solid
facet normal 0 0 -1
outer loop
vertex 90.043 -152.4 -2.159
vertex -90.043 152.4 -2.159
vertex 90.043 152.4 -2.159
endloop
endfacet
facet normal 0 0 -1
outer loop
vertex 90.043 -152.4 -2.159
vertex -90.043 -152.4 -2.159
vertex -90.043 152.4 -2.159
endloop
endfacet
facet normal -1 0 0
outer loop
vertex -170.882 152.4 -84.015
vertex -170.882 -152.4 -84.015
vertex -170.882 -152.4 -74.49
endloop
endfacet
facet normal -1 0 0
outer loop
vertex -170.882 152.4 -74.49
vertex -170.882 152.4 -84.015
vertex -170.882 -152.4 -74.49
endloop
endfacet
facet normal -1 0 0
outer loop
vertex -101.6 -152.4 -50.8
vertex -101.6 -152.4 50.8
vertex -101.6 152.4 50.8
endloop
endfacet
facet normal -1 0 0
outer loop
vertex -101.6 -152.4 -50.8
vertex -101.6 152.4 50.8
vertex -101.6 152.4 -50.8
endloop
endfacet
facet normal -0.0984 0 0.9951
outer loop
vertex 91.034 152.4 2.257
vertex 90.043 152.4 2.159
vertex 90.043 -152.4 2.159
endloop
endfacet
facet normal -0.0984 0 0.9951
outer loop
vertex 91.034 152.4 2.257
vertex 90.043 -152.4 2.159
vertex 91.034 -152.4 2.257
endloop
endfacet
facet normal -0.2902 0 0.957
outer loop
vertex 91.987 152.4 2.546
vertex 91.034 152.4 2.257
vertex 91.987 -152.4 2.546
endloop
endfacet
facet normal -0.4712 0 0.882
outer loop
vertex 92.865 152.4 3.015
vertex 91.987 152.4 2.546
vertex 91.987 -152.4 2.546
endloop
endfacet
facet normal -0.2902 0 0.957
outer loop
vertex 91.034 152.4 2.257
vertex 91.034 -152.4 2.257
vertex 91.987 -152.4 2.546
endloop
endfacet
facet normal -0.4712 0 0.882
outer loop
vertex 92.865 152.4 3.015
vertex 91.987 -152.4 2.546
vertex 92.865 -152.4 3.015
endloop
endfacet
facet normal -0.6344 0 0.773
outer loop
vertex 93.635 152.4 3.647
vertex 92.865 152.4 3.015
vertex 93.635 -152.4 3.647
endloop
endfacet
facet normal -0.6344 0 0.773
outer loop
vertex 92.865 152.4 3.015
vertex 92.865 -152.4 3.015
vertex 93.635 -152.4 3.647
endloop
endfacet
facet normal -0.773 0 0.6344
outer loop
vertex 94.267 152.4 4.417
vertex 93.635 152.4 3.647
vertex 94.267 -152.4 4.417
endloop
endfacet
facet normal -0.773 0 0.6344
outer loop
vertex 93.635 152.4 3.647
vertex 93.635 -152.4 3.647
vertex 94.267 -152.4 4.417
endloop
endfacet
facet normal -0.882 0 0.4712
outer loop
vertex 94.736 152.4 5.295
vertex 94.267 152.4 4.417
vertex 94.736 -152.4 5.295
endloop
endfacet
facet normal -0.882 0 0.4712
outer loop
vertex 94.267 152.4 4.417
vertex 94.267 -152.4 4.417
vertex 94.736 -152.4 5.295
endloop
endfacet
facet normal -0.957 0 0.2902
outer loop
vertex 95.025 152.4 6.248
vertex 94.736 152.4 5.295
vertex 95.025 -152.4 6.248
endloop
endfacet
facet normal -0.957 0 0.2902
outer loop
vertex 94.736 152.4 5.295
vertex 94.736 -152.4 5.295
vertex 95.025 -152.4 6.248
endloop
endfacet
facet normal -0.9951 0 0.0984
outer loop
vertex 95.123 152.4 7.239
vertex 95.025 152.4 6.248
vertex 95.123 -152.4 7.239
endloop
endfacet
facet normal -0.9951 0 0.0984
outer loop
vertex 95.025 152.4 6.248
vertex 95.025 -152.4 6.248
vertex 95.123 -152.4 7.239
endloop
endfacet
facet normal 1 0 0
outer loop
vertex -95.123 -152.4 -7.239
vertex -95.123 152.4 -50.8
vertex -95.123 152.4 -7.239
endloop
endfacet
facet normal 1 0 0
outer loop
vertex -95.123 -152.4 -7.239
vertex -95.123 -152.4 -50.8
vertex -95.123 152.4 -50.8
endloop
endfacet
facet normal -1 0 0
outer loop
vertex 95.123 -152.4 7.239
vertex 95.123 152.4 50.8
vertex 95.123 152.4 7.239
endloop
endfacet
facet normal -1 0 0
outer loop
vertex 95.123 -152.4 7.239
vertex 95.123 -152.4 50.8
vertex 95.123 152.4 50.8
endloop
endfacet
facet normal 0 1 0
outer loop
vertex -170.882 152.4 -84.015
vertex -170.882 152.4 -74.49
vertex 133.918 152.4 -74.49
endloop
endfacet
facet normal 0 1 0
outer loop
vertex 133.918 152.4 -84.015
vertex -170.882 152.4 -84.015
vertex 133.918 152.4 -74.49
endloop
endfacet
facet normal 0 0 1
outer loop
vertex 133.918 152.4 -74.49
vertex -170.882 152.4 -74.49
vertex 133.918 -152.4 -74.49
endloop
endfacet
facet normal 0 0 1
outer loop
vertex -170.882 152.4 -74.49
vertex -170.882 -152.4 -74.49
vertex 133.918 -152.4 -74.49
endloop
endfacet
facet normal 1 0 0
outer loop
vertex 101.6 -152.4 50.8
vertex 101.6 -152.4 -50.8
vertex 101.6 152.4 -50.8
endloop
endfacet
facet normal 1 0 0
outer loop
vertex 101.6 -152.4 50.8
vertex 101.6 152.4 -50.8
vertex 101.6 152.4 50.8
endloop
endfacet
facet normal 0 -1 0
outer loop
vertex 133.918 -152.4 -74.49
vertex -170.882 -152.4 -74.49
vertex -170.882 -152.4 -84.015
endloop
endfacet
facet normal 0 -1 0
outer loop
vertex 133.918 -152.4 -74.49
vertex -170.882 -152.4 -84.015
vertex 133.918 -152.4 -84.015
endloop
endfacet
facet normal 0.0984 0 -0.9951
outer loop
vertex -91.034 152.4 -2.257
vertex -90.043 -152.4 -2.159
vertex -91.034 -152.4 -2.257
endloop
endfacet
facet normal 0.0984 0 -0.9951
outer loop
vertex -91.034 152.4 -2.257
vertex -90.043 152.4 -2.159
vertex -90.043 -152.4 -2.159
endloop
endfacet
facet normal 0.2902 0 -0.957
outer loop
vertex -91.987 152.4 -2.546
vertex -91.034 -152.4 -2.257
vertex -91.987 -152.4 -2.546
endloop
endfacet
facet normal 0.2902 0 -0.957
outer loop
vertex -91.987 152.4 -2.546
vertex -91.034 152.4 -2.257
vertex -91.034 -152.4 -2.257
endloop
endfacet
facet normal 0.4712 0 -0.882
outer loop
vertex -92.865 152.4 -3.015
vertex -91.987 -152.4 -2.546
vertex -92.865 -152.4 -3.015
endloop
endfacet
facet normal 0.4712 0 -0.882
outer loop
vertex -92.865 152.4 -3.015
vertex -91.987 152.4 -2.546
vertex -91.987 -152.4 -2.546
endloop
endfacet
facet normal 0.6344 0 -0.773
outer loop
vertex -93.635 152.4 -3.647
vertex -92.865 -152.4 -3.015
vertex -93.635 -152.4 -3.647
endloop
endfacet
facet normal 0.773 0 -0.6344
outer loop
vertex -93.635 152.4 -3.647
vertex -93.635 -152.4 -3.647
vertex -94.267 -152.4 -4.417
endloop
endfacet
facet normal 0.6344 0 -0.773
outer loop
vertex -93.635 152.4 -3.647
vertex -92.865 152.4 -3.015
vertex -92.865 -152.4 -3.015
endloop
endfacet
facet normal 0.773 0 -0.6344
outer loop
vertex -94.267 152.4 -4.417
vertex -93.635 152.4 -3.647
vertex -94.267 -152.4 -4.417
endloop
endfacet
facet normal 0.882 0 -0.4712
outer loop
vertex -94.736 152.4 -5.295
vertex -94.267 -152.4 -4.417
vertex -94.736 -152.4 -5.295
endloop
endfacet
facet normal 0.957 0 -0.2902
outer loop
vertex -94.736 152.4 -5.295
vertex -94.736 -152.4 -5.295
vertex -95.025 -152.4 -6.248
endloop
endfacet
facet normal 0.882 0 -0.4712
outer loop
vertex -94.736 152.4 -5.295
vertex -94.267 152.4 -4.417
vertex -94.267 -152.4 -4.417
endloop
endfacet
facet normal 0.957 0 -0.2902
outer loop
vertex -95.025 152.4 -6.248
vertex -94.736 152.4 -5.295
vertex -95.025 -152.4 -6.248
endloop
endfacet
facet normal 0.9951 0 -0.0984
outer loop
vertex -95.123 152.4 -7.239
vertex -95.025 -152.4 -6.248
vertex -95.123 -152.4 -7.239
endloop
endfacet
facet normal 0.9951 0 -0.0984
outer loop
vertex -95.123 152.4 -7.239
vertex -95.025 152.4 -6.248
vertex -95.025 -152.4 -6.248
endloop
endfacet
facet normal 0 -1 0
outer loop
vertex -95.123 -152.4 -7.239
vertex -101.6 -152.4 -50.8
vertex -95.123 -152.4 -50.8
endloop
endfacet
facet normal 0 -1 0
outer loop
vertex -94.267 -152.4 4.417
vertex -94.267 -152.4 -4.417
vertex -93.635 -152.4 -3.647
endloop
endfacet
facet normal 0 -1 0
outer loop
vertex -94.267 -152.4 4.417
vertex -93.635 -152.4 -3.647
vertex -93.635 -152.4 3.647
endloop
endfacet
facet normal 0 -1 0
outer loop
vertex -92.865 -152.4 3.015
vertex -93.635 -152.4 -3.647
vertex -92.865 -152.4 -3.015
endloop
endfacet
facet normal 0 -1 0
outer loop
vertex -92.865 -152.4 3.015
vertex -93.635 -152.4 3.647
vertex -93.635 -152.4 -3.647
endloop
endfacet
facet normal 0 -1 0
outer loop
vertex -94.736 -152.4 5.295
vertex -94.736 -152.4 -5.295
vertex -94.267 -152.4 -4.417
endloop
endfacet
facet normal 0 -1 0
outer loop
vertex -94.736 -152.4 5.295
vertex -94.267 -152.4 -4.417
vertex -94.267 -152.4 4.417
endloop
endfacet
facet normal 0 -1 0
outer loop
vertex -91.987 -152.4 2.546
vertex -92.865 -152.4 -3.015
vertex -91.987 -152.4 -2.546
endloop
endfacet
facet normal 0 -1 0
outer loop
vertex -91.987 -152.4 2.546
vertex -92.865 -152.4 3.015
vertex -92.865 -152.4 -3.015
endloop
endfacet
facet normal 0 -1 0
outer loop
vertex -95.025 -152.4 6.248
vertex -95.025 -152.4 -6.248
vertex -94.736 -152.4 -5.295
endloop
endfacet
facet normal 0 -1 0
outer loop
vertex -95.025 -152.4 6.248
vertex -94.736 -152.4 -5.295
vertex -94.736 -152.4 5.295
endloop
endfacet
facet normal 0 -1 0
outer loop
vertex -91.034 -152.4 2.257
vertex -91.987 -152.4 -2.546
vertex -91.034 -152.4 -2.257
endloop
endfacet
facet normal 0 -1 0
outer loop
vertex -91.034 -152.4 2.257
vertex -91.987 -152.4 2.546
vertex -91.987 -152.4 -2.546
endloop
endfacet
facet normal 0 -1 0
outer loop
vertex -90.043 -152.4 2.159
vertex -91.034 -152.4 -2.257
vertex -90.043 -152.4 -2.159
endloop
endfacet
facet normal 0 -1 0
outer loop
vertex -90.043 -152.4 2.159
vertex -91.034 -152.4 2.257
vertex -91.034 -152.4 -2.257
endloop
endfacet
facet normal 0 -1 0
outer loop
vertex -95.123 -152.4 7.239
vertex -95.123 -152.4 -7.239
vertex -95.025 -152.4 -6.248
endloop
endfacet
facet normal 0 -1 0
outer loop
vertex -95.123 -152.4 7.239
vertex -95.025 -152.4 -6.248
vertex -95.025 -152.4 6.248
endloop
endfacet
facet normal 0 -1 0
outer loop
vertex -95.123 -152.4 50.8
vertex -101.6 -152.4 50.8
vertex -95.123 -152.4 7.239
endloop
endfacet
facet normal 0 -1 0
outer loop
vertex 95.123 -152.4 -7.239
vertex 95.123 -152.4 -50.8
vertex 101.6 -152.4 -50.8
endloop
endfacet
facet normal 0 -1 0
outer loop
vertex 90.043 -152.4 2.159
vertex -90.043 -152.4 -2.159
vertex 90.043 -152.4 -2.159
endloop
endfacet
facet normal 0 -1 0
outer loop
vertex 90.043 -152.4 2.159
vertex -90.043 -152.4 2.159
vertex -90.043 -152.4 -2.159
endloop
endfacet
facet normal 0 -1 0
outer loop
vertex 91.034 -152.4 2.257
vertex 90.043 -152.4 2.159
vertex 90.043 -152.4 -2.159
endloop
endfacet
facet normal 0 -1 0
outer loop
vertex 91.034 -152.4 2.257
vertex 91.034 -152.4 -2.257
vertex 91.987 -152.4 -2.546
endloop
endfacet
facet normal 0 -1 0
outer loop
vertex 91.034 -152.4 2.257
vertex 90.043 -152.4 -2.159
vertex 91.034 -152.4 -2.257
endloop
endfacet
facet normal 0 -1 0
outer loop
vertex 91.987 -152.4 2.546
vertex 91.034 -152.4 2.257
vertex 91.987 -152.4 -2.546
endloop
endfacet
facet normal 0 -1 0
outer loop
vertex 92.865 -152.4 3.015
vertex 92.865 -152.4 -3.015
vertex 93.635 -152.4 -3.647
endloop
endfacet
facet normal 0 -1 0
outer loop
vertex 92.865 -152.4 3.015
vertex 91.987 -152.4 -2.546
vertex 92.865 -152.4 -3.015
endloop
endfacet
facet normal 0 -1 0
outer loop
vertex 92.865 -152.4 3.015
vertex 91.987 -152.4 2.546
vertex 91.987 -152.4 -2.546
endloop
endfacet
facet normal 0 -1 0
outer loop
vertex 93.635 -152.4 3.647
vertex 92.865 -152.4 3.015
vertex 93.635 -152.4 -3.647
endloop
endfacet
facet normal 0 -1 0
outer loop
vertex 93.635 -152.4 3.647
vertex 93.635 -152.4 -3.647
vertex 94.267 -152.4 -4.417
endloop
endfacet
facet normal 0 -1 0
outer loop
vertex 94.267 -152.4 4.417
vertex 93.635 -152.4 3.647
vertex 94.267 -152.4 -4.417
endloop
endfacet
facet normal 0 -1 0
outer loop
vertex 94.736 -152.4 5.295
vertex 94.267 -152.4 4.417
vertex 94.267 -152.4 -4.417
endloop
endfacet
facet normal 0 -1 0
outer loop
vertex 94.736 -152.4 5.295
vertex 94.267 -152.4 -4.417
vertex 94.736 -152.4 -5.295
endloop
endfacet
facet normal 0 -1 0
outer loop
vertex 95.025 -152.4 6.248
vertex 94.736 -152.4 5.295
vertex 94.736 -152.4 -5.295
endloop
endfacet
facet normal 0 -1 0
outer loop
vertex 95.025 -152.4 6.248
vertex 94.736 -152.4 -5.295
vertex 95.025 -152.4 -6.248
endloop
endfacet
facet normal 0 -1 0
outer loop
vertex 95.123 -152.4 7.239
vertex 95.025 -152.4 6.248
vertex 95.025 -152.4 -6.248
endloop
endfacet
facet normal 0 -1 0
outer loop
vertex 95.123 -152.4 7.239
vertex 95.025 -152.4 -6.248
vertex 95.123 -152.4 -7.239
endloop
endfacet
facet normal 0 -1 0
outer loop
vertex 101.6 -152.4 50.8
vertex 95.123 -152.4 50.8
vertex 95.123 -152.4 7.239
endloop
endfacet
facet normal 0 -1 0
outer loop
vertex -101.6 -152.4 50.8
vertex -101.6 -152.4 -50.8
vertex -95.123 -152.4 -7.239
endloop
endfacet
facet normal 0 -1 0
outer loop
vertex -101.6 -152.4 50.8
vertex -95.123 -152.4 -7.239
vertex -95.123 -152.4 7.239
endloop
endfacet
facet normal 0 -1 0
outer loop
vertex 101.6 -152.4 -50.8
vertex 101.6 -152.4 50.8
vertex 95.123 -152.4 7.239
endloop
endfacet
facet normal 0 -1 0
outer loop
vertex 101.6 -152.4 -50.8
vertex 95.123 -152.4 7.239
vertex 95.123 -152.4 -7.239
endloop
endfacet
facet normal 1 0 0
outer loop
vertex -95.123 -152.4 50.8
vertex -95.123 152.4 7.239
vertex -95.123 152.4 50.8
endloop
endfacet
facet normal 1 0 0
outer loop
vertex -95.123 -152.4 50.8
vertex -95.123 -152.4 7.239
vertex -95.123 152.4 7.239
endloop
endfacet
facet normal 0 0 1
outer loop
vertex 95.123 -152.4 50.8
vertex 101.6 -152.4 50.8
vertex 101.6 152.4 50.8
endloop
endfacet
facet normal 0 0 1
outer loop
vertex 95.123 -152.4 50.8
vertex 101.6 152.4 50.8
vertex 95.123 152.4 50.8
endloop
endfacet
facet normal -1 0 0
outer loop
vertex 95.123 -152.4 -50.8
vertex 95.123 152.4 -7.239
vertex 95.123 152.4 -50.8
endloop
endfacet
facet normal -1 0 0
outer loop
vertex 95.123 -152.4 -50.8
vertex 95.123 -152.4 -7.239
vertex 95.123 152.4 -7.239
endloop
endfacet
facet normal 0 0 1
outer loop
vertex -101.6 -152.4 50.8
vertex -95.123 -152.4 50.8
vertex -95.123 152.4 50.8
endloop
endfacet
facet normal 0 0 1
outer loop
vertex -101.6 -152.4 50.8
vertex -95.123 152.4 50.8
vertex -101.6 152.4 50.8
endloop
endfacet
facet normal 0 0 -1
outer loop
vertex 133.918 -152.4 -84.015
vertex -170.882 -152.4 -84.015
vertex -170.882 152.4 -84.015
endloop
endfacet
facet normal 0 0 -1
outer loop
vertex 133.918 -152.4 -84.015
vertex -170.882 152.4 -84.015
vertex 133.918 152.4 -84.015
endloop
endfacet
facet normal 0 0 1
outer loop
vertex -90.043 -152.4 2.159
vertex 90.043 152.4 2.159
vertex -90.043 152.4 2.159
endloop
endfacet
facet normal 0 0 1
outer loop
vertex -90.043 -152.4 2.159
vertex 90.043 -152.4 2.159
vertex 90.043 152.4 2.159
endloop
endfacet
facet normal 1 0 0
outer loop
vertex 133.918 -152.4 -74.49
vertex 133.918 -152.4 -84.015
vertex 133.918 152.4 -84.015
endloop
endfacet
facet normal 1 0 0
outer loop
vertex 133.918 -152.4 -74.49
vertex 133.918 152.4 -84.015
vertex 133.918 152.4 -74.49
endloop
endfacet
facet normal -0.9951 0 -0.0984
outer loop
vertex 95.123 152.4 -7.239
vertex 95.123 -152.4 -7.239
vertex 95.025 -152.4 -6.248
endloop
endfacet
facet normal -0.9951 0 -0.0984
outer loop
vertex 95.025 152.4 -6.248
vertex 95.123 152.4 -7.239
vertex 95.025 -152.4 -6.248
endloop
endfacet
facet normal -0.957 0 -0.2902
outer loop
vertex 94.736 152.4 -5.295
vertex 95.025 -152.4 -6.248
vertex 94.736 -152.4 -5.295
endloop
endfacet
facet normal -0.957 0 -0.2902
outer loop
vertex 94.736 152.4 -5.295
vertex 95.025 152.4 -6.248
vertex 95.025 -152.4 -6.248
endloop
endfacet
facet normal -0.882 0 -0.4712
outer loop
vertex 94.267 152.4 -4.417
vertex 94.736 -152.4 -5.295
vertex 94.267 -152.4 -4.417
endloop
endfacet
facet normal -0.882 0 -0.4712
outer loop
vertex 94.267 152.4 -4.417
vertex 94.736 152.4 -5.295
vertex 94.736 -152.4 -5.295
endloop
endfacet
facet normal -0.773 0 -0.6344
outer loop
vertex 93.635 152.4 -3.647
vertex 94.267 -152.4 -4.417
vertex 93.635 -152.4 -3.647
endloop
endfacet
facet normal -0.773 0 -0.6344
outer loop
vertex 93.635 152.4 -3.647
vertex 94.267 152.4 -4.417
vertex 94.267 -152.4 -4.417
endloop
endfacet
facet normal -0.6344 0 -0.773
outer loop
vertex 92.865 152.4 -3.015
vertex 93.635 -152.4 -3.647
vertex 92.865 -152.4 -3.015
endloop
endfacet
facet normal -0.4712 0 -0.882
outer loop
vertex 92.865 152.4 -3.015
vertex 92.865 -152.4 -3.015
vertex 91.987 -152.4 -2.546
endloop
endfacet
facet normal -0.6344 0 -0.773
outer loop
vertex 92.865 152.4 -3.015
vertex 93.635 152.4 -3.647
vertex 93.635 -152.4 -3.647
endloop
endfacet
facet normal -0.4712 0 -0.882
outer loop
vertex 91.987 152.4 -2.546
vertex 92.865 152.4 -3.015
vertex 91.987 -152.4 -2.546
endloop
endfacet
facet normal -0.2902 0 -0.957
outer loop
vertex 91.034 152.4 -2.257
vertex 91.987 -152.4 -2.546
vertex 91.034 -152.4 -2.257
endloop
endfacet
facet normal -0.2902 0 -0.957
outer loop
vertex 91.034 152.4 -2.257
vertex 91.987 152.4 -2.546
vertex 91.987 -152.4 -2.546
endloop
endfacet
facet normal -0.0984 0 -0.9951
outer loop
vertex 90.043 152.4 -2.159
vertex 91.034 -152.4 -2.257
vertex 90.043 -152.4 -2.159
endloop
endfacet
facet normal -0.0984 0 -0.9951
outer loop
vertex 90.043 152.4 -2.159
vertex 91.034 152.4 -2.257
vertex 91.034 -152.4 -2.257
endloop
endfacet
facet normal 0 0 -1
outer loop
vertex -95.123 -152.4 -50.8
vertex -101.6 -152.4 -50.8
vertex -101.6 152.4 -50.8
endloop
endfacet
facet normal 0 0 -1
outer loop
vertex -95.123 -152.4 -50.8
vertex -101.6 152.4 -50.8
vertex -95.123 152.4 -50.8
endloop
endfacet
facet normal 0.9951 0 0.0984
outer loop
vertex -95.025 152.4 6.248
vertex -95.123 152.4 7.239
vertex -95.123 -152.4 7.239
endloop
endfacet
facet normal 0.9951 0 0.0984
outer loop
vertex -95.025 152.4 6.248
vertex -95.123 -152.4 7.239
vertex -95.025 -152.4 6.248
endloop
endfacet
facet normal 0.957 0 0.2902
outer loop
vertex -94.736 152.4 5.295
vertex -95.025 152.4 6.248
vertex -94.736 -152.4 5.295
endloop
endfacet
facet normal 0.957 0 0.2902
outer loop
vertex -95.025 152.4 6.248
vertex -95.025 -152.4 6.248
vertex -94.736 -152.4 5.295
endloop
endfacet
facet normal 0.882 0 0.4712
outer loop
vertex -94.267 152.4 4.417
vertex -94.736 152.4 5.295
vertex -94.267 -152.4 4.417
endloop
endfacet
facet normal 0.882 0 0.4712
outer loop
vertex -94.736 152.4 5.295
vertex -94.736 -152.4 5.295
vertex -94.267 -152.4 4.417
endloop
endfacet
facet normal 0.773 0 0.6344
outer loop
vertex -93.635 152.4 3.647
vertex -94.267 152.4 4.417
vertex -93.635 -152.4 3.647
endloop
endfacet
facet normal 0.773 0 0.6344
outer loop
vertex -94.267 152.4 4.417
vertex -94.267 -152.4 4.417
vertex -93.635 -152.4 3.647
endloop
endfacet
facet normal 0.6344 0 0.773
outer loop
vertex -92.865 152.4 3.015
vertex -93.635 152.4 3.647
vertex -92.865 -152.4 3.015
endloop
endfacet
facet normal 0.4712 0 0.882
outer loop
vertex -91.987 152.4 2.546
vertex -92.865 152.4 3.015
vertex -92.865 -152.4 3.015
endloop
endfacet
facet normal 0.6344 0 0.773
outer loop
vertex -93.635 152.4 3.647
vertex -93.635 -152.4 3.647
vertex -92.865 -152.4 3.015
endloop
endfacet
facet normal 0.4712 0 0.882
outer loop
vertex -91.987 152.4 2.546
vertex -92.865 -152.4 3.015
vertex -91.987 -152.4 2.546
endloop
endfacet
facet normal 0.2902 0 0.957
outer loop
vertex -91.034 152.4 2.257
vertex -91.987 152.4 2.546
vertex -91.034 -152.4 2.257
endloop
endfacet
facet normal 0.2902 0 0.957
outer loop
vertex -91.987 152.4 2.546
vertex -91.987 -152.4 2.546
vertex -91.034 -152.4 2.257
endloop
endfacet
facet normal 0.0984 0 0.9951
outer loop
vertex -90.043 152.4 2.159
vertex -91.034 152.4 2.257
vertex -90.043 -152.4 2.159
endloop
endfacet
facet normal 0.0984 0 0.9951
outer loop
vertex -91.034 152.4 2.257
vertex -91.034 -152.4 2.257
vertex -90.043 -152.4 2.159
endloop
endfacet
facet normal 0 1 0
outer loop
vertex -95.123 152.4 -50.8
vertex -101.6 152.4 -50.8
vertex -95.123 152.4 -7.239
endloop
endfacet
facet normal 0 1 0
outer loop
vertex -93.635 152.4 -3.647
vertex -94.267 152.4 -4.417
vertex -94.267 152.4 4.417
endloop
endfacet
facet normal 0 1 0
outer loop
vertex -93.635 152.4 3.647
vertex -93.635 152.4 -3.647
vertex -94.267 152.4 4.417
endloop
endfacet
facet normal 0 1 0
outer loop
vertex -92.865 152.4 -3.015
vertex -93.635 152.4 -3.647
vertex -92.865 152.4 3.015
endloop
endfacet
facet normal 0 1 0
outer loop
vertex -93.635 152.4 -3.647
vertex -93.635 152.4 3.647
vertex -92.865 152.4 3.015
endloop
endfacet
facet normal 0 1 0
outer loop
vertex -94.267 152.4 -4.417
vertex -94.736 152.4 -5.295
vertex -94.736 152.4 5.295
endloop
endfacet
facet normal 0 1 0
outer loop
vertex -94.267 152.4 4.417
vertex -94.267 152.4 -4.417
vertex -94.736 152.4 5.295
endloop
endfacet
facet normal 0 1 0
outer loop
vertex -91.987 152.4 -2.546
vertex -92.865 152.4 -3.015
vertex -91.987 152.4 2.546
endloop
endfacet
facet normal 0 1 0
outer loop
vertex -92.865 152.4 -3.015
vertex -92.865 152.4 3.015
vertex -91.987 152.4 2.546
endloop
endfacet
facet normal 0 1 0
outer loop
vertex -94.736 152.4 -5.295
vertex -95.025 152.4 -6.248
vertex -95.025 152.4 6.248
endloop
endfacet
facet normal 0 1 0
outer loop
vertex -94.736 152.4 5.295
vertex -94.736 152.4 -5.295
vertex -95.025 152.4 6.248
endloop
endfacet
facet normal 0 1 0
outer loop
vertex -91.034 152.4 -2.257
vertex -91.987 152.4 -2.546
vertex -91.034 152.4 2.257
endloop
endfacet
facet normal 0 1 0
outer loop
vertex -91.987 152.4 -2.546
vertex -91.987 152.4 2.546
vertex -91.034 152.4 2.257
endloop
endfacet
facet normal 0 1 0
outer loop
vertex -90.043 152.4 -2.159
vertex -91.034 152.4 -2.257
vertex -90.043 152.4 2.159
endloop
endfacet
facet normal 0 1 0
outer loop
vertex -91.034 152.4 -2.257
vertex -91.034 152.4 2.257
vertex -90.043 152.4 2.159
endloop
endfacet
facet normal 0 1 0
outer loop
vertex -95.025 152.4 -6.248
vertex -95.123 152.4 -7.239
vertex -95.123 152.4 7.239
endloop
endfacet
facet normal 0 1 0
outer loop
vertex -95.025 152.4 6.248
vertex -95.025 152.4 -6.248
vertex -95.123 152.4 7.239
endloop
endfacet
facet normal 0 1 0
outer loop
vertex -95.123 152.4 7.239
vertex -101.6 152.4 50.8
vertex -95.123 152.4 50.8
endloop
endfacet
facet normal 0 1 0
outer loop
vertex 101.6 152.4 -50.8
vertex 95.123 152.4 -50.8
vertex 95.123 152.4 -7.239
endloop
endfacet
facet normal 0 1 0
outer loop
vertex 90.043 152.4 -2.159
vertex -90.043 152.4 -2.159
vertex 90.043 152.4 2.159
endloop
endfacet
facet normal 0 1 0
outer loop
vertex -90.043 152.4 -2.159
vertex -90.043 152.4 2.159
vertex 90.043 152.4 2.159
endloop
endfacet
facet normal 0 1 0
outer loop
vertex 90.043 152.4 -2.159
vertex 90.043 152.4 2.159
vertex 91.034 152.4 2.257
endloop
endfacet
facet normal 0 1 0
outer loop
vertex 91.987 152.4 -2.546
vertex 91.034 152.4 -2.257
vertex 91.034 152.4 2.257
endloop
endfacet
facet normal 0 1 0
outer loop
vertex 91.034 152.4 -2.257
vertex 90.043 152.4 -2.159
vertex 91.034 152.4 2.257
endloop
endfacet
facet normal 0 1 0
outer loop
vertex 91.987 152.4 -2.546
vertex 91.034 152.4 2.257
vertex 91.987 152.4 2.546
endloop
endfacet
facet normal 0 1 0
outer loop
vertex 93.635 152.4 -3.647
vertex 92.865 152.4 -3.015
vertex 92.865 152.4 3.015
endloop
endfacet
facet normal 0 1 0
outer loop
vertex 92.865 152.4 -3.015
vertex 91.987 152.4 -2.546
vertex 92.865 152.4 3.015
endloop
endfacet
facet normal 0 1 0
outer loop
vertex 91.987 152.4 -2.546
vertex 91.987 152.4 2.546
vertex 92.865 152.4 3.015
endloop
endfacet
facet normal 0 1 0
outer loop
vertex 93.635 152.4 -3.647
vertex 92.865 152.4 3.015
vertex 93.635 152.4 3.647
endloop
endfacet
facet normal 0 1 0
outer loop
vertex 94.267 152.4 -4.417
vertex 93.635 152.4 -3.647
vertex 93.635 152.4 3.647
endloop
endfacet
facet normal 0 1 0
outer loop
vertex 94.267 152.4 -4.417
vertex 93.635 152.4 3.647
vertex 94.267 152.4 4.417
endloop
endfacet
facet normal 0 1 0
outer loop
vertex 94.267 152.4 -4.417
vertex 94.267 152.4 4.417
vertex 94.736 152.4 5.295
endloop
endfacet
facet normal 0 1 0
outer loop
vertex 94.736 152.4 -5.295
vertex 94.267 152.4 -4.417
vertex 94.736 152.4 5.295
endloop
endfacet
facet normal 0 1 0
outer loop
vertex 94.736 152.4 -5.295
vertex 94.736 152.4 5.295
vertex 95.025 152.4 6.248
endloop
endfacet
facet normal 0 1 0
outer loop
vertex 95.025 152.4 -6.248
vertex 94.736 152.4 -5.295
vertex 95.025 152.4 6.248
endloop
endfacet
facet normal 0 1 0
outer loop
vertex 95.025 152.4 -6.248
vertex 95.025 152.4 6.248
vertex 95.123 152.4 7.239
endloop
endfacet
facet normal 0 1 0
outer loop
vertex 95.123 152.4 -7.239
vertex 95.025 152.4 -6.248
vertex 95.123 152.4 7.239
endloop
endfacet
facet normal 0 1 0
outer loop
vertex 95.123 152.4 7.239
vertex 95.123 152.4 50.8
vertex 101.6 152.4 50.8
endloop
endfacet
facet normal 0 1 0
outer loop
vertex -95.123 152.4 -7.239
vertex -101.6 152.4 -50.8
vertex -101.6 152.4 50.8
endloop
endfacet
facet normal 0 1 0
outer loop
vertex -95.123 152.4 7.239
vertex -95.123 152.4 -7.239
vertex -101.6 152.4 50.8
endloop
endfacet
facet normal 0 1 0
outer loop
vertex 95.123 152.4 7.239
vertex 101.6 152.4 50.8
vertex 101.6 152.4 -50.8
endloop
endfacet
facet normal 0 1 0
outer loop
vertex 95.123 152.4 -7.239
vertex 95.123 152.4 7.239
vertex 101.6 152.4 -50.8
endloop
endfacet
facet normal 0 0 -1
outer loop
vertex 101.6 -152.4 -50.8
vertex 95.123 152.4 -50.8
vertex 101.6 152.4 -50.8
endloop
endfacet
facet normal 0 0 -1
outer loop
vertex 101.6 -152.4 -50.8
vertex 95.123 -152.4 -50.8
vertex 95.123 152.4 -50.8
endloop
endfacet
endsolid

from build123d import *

# Parameters (mm, degrees)
F1_DEPTH = 152.4
F2_R     = 5.08
F3_W     = 304.8
F3_H     = 9.525
F4_DEPTH = 152.4


with BuildPart() as f1:
    # F0 (on Front) → F1 (new body, symmetric)
    with BuildSketch(Plane.XZ):
        Polygon((95.123, -50.8), (101.6, -50.8), (101.6, 50.8), (95.123, 50.8), (95.123, 2.159), (-95.123, 2.159), (-95.123, 50.8), (-101.6, 50.8), (-101.6, -50.8), (-95.123, -50.8), (-95.123, -2.159), (95.123, -2.159), align=None)
    extrude(amount=F1_DEPTH, both=True)

    # F2
    f2_edges = [f1.edges().sort_by_distance(p)[0] for p in [
        (-95.123, 0, 2.159),
        (-95.123, 0, -2.159),
        (95.123, 0, -2.159),
        (95.123, 0, 2.159),
    ]]
    fillet(f2_edges, radius=F2_R)


with BuildPart() as f4:
    # F3 (on Front) → F4 (new body, symmetric)
    with BuildSketch(Plane.XZ):
        with Locations((-18.482328, -79.252832)):
            Rectangle(F3_W, F3_H)
    extrude(amount=F4_DEPTH, both=True)


solid = Compound([f1.part, f4.part])
